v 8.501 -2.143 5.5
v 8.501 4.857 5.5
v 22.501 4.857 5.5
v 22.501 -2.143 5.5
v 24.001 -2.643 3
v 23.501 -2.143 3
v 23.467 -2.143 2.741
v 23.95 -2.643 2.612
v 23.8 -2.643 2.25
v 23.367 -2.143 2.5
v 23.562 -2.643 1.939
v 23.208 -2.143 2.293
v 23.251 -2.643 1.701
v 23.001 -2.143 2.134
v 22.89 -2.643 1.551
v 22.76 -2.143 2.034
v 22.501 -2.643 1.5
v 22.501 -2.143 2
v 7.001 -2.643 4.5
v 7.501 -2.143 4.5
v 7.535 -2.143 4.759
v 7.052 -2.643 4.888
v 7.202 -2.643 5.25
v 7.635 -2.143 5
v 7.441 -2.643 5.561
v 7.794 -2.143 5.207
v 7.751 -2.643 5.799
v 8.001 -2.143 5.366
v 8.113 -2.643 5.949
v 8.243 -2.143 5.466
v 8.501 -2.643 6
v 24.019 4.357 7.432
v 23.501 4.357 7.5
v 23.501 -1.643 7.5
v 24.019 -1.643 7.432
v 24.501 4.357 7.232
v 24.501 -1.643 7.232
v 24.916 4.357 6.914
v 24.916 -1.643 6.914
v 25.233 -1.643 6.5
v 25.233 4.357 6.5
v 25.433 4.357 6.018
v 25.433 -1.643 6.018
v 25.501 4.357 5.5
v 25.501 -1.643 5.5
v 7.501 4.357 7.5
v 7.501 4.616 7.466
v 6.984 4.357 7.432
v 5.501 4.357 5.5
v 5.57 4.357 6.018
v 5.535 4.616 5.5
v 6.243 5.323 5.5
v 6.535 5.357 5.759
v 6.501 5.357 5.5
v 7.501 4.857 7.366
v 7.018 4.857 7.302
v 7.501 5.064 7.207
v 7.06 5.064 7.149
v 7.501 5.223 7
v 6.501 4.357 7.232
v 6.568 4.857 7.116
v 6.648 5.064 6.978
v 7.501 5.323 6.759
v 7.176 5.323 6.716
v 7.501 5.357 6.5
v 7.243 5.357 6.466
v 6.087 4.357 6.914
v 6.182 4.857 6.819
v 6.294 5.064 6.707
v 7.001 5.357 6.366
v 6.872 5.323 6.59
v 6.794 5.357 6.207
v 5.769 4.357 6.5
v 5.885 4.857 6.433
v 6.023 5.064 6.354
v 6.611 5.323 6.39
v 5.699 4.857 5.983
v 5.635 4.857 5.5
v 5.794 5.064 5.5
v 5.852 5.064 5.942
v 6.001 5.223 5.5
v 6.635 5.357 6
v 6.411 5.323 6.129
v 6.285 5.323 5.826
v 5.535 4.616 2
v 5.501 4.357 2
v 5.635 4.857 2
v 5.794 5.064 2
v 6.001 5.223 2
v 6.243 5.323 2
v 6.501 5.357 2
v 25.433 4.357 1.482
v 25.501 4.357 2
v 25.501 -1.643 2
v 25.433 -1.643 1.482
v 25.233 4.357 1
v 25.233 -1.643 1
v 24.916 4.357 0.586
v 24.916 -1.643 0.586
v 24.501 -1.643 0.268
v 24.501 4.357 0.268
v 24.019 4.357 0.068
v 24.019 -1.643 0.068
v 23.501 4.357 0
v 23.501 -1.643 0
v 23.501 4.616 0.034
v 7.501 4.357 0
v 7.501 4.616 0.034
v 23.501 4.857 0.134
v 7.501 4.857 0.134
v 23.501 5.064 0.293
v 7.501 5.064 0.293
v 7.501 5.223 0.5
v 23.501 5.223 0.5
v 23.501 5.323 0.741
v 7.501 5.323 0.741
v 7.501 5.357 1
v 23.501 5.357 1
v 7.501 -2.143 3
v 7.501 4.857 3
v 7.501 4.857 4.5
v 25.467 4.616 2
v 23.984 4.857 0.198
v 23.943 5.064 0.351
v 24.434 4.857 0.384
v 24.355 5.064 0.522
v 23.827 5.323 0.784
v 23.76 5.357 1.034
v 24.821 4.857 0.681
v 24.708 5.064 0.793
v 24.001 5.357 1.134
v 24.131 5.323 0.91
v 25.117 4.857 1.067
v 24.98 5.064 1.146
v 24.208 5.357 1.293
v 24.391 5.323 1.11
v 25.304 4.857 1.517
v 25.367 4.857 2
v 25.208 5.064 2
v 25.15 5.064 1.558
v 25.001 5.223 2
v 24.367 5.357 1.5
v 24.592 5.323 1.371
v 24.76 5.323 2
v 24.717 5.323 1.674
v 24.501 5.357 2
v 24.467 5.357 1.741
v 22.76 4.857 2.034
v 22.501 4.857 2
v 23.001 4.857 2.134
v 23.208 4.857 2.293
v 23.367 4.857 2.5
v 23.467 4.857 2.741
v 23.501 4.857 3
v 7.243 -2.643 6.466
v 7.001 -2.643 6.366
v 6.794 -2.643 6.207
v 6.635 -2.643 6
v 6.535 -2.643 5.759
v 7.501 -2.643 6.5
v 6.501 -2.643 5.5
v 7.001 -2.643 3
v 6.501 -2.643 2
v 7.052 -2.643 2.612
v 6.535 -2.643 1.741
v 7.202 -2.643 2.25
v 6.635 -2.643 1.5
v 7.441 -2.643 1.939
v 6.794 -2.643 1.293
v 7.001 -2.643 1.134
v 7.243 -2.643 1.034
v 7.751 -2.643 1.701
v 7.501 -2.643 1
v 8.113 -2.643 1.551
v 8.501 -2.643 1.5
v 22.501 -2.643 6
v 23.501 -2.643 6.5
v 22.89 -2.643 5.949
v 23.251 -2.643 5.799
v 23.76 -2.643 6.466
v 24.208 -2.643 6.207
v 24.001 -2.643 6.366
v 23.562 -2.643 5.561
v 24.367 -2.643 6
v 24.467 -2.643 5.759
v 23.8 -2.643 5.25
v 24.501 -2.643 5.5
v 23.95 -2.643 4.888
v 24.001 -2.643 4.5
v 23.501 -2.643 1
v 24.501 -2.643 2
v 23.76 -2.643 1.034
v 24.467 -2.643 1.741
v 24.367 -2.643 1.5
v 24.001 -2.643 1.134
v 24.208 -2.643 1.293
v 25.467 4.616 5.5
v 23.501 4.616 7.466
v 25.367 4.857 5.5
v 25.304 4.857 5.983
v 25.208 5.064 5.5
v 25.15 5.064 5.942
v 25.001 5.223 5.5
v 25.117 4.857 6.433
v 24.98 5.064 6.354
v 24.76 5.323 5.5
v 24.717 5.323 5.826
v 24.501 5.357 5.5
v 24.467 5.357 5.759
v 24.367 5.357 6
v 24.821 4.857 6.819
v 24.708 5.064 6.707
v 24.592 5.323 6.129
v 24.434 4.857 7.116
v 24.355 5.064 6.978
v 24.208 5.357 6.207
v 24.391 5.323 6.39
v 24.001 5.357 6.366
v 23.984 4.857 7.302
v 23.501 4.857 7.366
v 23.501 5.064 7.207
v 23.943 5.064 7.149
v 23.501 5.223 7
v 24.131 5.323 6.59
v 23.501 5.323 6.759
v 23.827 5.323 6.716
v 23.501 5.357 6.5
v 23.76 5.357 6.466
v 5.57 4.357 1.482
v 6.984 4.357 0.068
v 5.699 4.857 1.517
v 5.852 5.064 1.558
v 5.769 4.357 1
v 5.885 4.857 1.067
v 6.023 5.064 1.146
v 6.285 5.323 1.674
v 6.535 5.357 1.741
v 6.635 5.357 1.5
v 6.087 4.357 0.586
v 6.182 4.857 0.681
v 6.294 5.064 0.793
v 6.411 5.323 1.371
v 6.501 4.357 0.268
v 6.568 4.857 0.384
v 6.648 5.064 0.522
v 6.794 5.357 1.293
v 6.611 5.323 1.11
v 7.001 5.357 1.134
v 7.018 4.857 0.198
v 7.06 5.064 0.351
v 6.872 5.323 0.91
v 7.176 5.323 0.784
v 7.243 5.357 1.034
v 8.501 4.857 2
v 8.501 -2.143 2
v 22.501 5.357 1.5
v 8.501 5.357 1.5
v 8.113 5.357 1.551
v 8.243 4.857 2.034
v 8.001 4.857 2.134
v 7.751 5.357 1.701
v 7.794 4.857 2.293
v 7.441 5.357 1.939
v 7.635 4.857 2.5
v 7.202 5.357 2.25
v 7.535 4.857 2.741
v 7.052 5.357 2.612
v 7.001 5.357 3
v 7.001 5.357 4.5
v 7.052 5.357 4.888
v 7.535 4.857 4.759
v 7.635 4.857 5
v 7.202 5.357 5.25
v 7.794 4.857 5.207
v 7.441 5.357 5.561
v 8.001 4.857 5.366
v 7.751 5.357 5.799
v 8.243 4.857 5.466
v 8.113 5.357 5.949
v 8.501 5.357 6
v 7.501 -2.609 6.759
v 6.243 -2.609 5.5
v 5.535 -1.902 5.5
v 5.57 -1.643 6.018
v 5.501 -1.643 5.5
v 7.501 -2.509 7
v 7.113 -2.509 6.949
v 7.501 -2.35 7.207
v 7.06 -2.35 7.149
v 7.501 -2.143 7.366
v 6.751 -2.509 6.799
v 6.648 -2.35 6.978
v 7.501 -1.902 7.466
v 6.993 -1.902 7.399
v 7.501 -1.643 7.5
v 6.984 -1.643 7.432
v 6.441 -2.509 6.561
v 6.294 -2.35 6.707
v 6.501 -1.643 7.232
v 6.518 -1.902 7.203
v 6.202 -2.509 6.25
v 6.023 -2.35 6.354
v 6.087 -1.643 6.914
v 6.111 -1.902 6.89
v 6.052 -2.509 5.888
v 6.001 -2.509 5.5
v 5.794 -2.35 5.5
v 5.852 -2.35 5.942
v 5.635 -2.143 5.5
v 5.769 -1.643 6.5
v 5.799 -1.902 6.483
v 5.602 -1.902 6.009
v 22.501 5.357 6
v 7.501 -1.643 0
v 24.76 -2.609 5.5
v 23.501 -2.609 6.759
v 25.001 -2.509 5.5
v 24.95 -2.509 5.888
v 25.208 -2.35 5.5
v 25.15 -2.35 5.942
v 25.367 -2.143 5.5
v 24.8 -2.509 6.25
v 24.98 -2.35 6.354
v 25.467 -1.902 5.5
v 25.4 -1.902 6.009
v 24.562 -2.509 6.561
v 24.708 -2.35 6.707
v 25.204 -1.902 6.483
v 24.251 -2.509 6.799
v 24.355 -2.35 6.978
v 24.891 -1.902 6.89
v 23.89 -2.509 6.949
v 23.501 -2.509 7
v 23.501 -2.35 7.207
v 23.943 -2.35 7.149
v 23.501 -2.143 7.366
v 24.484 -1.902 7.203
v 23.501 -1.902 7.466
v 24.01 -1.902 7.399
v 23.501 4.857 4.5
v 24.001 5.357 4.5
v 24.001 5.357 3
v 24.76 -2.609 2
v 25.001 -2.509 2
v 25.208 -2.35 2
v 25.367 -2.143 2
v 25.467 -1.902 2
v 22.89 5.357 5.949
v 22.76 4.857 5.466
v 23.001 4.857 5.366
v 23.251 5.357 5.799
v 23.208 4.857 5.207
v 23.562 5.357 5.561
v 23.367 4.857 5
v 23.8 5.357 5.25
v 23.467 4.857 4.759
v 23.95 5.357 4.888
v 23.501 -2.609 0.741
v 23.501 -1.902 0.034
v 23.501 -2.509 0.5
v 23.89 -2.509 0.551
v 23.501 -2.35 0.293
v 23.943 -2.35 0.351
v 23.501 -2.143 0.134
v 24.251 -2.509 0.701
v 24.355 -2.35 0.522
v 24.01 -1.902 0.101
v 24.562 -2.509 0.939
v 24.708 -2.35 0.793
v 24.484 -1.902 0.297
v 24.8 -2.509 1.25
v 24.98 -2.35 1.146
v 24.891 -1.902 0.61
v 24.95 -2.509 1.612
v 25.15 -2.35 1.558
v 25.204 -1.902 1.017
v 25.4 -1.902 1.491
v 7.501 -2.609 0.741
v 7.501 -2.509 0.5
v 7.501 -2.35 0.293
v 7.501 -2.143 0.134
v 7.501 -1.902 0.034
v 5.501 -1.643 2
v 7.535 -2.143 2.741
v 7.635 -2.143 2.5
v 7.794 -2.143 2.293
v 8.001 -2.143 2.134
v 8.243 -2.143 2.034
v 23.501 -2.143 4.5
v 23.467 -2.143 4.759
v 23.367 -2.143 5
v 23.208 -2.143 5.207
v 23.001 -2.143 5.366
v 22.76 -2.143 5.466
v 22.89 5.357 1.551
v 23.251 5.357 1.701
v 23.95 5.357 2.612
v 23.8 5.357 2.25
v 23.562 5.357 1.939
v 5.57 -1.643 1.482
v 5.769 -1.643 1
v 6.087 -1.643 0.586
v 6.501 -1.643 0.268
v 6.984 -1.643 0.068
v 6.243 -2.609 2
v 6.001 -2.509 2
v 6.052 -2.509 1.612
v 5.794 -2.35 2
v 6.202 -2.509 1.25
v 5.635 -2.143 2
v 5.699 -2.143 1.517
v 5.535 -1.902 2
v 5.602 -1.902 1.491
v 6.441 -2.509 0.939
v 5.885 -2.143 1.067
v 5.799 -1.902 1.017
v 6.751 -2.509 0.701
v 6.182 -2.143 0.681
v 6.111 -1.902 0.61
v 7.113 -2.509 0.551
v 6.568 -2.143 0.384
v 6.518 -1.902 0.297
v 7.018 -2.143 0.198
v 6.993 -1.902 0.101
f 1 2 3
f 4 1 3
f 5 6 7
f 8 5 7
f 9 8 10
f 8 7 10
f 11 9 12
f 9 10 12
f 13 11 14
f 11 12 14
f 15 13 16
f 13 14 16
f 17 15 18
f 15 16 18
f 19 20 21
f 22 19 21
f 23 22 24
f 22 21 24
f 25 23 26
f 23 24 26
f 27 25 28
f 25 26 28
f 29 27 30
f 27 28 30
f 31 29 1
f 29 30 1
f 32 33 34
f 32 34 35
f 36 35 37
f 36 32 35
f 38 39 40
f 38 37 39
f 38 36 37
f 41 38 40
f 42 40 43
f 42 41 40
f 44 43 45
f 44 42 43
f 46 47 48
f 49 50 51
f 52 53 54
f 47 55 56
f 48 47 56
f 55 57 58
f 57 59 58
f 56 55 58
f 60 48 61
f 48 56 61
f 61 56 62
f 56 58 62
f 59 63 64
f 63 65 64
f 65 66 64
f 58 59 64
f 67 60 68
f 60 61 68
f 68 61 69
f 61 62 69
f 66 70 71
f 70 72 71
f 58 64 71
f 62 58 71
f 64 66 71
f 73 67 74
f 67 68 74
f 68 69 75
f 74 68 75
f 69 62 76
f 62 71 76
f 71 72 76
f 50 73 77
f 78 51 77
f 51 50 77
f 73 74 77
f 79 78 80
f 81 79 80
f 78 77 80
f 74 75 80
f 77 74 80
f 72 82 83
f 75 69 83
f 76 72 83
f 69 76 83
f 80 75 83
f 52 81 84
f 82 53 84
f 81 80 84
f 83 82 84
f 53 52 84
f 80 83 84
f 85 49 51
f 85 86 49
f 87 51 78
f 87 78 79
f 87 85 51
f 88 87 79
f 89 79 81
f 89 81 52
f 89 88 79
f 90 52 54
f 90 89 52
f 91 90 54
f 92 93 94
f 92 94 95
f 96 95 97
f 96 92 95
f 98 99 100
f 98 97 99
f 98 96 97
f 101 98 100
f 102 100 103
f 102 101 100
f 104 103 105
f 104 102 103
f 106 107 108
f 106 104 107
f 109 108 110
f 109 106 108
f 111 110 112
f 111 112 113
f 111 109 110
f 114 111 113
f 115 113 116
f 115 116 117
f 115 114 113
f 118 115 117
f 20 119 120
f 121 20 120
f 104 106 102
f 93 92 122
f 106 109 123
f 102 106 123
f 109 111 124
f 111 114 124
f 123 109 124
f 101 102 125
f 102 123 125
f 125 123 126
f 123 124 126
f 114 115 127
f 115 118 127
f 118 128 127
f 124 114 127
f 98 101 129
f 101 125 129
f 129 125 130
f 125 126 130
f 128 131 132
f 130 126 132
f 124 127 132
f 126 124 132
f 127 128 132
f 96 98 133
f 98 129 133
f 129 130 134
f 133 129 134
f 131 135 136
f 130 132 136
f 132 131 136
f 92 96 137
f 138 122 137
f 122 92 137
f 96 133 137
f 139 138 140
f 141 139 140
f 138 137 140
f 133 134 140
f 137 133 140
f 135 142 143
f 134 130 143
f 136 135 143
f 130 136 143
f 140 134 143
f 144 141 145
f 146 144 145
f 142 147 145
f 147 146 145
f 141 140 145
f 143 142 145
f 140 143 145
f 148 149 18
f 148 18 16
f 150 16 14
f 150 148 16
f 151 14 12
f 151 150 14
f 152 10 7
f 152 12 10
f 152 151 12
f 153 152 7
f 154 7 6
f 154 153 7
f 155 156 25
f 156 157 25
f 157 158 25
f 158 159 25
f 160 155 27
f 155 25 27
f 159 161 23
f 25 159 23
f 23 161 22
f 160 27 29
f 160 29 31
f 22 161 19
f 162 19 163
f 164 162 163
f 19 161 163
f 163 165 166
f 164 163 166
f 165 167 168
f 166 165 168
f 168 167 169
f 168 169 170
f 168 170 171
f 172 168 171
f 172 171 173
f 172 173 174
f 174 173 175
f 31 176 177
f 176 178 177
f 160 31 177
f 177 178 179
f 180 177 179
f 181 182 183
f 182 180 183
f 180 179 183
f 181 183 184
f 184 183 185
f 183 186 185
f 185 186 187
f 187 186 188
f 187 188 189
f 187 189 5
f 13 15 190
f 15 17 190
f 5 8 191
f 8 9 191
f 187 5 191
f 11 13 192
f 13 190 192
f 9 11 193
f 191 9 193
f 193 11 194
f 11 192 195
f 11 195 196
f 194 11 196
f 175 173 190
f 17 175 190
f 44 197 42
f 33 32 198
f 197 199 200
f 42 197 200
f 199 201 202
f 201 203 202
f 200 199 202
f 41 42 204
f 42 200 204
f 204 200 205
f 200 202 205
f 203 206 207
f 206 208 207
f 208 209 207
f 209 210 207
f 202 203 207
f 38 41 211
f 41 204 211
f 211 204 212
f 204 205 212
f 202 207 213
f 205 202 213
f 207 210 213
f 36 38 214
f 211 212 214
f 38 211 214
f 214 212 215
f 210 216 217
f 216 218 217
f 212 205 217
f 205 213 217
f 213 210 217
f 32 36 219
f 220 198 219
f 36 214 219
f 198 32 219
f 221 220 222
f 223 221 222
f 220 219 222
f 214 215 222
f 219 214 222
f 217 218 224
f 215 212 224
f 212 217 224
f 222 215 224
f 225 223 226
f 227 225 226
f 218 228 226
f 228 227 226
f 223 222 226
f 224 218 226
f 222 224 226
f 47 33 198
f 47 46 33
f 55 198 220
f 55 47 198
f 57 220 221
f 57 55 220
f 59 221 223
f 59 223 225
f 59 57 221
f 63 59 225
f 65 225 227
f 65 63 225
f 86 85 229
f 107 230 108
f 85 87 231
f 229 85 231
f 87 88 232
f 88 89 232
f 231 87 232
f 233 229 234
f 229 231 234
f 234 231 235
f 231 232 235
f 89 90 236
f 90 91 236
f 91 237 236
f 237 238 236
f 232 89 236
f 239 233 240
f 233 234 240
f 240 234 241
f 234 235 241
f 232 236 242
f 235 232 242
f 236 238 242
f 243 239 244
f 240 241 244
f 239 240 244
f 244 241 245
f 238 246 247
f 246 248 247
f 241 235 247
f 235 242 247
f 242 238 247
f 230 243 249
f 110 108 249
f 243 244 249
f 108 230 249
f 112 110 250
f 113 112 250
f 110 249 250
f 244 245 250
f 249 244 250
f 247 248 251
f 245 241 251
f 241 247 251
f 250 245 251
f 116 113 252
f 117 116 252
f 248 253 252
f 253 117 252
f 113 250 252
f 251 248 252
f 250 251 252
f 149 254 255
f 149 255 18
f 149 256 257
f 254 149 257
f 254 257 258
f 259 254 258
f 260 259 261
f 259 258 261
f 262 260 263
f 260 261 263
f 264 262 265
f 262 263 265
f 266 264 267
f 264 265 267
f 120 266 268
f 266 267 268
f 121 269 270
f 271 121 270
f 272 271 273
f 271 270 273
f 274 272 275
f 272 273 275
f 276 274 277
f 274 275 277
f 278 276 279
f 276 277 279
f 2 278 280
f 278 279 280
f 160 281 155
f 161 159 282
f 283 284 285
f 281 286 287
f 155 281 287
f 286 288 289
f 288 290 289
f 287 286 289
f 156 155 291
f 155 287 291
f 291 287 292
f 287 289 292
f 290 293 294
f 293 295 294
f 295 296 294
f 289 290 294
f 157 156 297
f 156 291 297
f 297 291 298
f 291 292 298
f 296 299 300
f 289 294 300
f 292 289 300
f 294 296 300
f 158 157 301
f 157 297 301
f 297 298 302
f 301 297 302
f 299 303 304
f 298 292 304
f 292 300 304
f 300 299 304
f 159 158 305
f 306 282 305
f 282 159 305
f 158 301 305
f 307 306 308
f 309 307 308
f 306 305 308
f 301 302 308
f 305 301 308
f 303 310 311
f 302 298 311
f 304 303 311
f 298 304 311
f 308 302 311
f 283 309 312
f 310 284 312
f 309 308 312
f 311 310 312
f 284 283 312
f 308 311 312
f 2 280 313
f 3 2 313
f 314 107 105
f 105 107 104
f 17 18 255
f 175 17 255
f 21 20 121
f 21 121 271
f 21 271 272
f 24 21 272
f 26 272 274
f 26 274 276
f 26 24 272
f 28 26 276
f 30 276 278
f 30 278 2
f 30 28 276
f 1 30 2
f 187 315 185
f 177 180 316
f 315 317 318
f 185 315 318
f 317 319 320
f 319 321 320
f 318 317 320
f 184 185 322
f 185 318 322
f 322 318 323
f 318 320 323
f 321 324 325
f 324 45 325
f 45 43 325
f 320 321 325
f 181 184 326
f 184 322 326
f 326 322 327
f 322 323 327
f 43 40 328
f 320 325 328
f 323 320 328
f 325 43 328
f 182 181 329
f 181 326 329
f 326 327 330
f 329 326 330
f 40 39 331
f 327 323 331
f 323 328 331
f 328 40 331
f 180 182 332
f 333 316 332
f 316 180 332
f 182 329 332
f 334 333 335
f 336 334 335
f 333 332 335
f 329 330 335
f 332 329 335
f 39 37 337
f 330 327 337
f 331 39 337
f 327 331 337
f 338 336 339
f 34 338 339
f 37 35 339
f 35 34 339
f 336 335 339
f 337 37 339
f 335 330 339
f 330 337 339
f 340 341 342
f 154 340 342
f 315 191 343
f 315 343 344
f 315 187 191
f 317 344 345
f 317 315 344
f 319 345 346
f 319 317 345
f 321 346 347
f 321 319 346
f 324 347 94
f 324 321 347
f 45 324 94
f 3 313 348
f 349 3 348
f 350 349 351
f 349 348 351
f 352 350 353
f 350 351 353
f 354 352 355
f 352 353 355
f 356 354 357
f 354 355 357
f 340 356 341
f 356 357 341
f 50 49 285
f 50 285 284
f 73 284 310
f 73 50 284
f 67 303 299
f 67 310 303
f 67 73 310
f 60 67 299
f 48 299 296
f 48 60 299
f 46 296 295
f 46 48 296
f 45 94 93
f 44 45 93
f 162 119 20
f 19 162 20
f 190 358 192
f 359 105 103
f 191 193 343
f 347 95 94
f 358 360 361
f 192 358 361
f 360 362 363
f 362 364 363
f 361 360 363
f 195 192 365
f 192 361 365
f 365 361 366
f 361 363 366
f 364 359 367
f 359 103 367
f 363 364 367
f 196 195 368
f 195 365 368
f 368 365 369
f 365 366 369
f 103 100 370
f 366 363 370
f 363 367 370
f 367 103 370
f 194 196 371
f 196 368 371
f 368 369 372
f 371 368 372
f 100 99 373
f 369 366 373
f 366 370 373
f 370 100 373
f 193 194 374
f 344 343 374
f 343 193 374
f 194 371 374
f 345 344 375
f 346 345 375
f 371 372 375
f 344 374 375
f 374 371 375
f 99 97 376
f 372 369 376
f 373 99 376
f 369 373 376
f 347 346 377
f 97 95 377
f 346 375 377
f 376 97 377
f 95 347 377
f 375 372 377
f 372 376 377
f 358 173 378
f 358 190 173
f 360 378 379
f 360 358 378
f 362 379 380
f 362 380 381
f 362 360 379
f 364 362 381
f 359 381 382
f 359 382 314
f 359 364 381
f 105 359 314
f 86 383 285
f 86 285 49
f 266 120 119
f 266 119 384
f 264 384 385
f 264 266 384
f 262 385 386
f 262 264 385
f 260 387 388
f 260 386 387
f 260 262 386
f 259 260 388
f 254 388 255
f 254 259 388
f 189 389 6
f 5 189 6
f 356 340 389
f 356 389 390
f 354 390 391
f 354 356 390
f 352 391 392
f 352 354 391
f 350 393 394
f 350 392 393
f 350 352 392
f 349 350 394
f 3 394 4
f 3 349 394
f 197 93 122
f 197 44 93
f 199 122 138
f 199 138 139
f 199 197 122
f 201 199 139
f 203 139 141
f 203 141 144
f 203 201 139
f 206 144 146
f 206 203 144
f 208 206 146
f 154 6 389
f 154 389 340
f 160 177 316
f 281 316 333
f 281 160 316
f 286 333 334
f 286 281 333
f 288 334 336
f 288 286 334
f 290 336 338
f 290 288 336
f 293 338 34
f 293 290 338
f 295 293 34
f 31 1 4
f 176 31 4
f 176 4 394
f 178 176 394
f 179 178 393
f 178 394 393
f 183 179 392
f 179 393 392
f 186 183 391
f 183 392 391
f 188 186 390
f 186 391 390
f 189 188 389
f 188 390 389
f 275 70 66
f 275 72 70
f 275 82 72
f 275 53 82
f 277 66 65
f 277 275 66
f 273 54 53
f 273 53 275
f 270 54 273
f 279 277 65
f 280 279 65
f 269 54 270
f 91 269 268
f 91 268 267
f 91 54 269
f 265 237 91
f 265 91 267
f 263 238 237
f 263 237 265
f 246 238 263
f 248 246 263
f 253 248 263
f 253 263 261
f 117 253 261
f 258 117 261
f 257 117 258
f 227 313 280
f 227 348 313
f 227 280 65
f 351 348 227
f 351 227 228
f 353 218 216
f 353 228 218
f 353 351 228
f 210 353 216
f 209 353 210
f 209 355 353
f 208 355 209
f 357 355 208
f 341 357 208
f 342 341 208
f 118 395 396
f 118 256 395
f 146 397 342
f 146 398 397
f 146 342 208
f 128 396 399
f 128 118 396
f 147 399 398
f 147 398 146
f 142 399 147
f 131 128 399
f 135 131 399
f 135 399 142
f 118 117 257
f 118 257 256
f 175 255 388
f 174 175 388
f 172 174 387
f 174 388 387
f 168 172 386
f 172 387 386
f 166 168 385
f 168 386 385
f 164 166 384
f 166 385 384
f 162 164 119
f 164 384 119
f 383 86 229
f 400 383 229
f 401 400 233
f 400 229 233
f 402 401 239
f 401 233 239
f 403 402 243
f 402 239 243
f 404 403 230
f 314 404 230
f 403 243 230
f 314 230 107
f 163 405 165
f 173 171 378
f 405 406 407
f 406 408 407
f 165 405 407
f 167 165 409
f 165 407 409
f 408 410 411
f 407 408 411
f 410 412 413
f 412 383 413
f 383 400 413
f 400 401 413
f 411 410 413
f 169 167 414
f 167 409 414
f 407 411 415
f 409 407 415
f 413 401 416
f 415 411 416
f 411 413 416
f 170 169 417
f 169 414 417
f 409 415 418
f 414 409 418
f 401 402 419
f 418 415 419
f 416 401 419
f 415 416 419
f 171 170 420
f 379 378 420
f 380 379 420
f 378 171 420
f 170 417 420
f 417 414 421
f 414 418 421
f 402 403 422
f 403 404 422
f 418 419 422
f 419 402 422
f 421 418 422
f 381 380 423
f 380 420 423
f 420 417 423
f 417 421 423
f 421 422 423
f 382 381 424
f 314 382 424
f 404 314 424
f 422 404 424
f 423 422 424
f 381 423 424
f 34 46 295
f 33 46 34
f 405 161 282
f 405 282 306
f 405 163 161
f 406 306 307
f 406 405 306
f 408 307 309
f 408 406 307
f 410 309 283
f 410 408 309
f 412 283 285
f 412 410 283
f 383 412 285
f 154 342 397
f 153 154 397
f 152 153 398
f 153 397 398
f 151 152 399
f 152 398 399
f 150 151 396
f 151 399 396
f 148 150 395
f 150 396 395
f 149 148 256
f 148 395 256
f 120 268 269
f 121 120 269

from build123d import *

# Parameters (mm, degrees)
F0_W     = 20
F0_H     = 8
F1_DEPTH = 7.5
F2_T     = -2
F3_DEPTH = 25
F4_R     = 2
F5_R     = 1
F6_R     = 1
F7_SIZE  = 0.5
F9_DEPTH = 1


with BuildPart() as f1:
    # F0 (on Top) → F1 (new body)
    with BuildSketch(Plane.XY):
        with Locations((15.5013518035, 1.3572655581)):
            Rectangle(F0_W, F0_H)
    extrude(amount=F1_DEPTH)

    # F2
    f2_openings = [f1.faces().sort_by_distance(p)[0] for p in [
        (15.501352, -2.642734, 3.75),
    ]]
    offset(amount=F2_T, openings=f2_openings)

    # F3 (cut): a face of the model
    f3_faces = [f1.faces().sort_by_distance(p)[0] for p in [
        (15.5013518035, 3.3572655581, 3.75),
    ]]
    extrude(f3_faces, amount=-F3_DEPTH, mode=Mode.SUBTRACT)

    # F4
    f4_edges = [f1.edges().sort_by_distance(p)[0] for p in [
        (25.501352, 1.357266, 7.5),
        (25.501352, 1.357266, 0),
        (5.501352, 1.357266, 7.5),
        (5.501352, 1.357266, 0),
    ]]
    fillet(f4_edges, radius=F4_R)

    # F5
    f5_edges = [f1.edges().sort_by_distance(p)[0] for p in [
        (7.501352, 1.357266, 5.5),
        (7.501352, 1.357266, 2),
        (23.501352, 1.357266, 5.5),
        (23.501352, 1.357266, 2),
    ]]
    fillet(f5_edges, radius=F5_R)

    # F6
    f6_edges = [f1.edges().sort_by_distance(p)[0] for p in [
        (15.501352, -2.642734, 0),
        (15.501352, 5.357266, 0),
    ]]
    fillet(f6_edges, radius=F6_R)

    # F7
    f7_edges = [f1.edges().sort_by_distance(p)[0] for p in [
        (15.501352, -2.642734, 5.5),
        (15.501352, 5.357266, 5.5),
    ]]
    chamfer(f7_edges, length=F7_SIZE)

    # F8 (on face) → F9 (join)
    with BuildSketch(Plane.XY.offset(7.5)):
        Polygon((9.5939766616, 4.3572655581), (8.2856733352, 4.3572655581), (8.2856733352, -1.6427344419), (9.5939766616, -1.6427344419), (9.5939766616, 1.0383471381), (10.6051471084, -1.6427344419), (12.1620288119, -1.6427344419), (10.7613857836, 1.5246823896), (12.1620288119, 4.3572655581), (10.5070443824, 4.3572655581), (9.5939766616, 2.1014690865), align=None)
        Polygon((16.4463743567, 4.3572655581), (12.1620288119, 4.3572655581), (12.1620288119, -1.6427344419), (16.4463743567, -1.6427344419), (16.4463743567, 1.214308897), (14.3119534478, 1.214308897), (14.3119534478, 0.6480877637), (15.4404239729, 0.6480877637), (15.4404239729, 0), (13.5471438989, 0), (13.5471438989, 3.0533354729), (15.4435969889, 3.0533354729), (15.4435969889, 2.0766169764), (16.4463743567, 2.0766169764), align=None)
    extrude(amount=-F9_DEPTH)


solid = f1.part
